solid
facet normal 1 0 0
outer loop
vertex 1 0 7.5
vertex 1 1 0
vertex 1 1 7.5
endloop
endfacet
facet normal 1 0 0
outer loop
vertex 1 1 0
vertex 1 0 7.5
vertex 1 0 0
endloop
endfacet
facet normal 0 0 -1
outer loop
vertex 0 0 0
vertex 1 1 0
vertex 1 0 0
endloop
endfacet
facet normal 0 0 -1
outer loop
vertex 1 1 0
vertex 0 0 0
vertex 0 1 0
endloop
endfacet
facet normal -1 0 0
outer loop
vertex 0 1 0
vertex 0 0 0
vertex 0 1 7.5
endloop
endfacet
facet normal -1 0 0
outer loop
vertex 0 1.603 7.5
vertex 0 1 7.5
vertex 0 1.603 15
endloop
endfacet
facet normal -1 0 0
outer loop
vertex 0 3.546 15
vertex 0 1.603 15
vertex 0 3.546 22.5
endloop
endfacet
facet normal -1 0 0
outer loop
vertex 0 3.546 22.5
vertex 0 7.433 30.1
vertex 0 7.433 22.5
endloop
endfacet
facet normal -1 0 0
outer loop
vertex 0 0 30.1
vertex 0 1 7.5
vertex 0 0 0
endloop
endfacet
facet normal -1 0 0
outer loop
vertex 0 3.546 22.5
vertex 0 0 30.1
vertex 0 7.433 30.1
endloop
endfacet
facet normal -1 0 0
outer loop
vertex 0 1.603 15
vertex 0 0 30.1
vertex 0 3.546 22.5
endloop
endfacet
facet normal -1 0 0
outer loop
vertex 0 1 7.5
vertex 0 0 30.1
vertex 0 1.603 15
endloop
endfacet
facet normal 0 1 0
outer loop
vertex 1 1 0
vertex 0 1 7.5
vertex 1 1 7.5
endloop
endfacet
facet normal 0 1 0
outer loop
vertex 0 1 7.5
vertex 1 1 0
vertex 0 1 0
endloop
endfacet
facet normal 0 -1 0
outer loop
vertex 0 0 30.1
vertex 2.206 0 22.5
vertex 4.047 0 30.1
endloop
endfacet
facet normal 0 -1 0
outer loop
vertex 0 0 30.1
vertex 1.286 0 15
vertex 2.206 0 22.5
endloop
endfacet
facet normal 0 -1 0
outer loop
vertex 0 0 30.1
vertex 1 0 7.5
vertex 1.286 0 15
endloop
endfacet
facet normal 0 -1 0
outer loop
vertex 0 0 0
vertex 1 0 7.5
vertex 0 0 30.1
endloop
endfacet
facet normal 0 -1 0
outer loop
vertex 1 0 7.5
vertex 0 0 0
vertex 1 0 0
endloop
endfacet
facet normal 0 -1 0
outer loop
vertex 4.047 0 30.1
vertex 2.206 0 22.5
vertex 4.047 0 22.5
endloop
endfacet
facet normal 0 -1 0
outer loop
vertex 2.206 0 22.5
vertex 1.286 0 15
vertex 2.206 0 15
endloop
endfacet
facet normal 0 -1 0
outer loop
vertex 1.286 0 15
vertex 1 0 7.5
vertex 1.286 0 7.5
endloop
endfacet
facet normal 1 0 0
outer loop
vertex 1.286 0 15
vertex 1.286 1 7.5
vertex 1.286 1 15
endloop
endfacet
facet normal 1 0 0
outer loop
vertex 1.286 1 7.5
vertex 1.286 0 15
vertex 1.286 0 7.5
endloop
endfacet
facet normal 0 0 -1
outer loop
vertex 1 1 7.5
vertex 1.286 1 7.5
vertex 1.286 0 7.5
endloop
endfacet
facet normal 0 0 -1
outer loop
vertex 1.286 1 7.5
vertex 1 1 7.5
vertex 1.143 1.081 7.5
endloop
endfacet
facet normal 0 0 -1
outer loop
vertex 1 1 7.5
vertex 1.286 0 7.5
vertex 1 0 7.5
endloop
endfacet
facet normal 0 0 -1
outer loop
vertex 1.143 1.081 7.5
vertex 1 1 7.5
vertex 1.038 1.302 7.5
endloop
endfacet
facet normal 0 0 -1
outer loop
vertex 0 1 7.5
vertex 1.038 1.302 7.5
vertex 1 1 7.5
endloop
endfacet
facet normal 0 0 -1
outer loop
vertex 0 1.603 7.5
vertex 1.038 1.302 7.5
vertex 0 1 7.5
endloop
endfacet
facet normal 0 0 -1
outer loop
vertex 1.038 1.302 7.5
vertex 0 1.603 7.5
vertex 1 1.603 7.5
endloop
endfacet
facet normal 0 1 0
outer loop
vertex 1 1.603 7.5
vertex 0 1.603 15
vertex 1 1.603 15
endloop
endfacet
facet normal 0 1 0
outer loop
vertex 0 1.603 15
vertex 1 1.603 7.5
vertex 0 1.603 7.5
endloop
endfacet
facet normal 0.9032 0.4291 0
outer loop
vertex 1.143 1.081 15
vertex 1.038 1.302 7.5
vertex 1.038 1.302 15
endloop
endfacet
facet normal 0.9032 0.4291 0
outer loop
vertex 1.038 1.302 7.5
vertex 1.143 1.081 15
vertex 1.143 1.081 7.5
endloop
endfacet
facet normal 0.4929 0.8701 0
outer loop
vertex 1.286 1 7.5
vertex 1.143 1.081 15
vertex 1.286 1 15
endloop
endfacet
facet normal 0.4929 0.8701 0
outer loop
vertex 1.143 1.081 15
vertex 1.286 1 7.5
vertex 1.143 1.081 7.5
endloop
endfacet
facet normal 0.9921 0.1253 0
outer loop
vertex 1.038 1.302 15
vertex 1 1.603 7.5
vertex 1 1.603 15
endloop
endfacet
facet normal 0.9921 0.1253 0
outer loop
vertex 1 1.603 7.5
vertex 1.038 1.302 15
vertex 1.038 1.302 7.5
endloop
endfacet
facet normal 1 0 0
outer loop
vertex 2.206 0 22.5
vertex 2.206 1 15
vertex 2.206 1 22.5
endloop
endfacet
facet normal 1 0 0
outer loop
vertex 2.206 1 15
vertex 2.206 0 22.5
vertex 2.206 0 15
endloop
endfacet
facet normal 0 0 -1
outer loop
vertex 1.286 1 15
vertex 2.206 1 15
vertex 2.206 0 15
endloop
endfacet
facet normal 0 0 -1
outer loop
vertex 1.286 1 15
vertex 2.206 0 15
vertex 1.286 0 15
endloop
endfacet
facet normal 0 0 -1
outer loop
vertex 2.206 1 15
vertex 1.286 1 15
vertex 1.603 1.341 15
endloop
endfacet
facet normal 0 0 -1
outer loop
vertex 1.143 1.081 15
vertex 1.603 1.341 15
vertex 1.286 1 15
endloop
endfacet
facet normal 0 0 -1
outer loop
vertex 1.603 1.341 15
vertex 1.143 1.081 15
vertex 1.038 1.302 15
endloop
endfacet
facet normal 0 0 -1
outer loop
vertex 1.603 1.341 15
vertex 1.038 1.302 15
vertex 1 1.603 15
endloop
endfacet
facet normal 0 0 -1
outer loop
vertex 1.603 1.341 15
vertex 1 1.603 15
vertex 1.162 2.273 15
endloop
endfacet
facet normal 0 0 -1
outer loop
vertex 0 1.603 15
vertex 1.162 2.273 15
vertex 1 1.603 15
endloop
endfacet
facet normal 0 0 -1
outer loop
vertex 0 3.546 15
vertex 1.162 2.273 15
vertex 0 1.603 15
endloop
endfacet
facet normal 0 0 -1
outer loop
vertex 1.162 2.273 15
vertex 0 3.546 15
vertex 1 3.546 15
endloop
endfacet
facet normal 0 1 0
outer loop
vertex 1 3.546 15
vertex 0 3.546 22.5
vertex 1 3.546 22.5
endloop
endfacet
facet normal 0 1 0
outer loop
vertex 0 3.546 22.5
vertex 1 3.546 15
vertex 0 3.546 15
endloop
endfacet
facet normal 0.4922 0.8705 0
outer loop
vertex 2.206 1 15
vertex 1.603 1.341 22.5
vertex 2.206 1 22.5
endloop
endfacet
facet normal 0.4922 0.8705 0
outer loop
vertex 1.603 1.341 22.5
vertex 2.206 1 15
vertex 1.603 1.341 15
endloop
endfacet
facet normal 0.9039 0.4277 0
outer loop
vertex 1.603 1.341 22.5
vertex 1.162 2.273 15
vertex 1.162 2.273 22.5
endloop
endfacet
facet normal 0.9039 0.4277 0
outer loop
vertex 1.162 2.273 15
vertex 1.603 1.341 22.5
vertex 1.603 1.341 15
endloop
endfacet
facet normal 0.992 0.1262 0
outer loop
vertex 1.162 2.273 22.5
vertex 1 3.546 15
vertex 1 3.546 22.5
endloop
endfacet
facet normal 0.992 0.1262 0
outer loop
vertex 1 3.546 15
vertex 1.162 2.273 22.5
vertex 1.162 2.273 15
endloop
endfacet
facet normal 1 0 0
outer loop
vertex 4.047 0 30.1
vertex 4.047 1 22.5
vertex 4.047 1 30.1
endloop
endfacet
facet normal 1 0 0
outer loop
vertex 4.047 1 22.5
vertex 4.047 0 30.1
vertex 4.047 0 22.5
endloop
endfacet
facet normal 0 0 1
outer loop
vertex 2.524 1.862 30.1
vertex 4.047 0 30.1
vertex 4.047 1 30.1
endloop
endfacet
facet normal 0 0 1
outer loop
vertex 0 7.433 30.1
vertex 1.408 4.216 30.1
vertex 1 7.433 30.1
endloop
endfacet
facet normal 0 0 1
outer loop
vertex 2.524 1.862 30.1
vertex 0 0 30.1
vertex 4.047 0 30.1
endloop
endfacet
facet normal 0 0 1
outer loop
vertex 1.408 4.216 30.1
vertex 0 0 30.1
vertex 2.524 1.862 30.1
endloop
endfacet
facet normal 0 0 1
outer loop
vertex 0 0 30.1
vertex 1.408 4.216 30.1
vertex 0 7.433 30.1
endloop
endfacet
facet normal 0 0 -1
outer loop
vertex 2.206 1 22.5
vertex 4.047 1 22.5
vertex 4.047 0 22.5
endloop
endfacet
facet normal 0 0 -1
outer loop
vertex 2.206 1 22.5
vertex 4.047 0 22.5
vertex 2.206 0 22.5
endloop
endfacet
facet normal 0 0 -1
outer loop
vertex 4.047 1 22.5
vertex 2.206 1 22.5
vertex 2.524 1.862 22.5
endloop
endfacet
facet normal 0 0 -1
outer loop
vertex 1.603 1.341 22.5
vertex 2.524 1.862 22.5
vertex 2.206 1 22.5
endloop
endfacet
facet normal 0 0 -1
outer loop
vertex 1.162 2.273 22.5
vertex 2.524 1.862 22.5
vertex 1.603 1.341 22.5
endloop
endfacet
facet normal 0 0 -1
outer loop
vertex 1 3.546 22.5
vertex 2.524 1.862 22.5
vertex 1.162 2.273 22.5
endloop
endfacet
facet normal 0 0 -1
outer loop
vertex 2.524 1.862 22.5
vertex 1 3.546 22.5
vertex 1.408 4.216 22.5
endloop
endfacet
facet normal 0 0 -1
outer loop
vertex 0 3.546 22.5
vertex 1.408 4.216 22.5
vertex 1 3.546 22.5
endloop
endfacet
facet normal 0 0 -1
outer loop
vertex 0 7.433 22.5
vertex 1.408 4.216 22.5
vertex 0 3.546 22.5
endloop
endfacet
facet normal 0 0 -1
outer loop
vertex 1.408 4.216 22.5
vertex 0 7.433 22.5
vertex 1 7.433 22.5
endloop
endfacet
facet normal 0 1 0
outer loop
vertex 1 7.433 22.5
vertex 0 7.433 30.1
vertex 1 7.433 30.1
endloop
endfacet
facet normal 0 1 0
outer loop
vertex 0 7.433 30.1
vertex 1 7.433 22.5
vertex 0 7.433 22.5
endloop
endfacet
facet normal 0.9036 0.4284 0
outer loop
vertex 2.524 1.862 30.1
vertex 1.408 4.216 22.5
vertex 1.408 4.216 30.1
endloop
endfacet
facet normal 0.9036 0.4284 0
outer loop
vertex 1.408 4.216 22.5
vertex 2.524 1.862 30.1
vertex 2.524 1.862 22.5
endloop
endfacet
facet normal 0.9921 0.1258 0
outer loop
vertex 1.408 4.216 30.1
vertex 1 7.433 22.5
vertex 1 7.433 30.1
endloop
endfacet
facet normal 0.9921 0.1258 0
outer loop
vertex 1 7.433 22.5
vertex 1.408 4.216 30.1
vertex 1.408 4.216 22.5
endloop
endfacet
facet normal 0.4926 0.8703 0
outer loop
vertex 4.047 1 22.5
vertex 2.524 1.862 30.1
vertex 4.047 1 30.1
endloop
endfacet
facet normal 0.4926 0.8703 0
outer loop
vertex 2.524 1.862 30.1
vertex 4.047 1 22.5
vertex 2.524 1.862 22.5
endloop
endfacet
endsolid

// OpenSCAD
module exp_slice(w1, w2, h, z, nsteps) {

  dw = w2-w1;

  union() {
    for (k = [0:1:(nsteps)]) {

      translate([0,0,z*(1 - k/nsteps)])

	//	cube([w1, h1, 1] + k* [ dw, dh, 0 ]/nsteps);

	cube([w2,h,z/nsteps] + [ -dw*sqrt(1-(k/nsteps)*(k/nsteps)),
			   0,
			   0
			  ]);
    }
  }

}

module ell_slice(w1, w2, h1, h2, z, n) {
  difference() {
    cube([w2,h2,z]);
    translate([w2,h2,-1]) scale([(w2-w1),(h2-h1),1]) cylinder(r=1, h=z+2, $fn=n*4);
  }
}




module exp_blob(w1, w2, h1, h2, z, nsteps_w, nsteps_h) {

  dw = w2-w1;
  dh = h2-h1;


  dz = z/nsteps_w;

  translate([0,0,0])
  union() {
    for (k = [0:(1/nsteps_w):((nsteps_w-1)/nsteps_w)]) {
      translate([0,0,z*k])
	ell_slice(h1, h2-dh*sqrt(1-k*k), w1, w2-dw*sqrt(1-k*k), dz+0.1, nsteps_h);
    }
  }
}


//translate([20,0,0]) exp_slice(1,20, 3, 15, 8);

exp_blob(1, 20, 1, 10, 30, 4,3);
/*
cube(10,10,10);
*/
//translate([20,0,0]) rotate([90,0,0]) ell_slice(1, 20, 0, 15, 3, 8);
